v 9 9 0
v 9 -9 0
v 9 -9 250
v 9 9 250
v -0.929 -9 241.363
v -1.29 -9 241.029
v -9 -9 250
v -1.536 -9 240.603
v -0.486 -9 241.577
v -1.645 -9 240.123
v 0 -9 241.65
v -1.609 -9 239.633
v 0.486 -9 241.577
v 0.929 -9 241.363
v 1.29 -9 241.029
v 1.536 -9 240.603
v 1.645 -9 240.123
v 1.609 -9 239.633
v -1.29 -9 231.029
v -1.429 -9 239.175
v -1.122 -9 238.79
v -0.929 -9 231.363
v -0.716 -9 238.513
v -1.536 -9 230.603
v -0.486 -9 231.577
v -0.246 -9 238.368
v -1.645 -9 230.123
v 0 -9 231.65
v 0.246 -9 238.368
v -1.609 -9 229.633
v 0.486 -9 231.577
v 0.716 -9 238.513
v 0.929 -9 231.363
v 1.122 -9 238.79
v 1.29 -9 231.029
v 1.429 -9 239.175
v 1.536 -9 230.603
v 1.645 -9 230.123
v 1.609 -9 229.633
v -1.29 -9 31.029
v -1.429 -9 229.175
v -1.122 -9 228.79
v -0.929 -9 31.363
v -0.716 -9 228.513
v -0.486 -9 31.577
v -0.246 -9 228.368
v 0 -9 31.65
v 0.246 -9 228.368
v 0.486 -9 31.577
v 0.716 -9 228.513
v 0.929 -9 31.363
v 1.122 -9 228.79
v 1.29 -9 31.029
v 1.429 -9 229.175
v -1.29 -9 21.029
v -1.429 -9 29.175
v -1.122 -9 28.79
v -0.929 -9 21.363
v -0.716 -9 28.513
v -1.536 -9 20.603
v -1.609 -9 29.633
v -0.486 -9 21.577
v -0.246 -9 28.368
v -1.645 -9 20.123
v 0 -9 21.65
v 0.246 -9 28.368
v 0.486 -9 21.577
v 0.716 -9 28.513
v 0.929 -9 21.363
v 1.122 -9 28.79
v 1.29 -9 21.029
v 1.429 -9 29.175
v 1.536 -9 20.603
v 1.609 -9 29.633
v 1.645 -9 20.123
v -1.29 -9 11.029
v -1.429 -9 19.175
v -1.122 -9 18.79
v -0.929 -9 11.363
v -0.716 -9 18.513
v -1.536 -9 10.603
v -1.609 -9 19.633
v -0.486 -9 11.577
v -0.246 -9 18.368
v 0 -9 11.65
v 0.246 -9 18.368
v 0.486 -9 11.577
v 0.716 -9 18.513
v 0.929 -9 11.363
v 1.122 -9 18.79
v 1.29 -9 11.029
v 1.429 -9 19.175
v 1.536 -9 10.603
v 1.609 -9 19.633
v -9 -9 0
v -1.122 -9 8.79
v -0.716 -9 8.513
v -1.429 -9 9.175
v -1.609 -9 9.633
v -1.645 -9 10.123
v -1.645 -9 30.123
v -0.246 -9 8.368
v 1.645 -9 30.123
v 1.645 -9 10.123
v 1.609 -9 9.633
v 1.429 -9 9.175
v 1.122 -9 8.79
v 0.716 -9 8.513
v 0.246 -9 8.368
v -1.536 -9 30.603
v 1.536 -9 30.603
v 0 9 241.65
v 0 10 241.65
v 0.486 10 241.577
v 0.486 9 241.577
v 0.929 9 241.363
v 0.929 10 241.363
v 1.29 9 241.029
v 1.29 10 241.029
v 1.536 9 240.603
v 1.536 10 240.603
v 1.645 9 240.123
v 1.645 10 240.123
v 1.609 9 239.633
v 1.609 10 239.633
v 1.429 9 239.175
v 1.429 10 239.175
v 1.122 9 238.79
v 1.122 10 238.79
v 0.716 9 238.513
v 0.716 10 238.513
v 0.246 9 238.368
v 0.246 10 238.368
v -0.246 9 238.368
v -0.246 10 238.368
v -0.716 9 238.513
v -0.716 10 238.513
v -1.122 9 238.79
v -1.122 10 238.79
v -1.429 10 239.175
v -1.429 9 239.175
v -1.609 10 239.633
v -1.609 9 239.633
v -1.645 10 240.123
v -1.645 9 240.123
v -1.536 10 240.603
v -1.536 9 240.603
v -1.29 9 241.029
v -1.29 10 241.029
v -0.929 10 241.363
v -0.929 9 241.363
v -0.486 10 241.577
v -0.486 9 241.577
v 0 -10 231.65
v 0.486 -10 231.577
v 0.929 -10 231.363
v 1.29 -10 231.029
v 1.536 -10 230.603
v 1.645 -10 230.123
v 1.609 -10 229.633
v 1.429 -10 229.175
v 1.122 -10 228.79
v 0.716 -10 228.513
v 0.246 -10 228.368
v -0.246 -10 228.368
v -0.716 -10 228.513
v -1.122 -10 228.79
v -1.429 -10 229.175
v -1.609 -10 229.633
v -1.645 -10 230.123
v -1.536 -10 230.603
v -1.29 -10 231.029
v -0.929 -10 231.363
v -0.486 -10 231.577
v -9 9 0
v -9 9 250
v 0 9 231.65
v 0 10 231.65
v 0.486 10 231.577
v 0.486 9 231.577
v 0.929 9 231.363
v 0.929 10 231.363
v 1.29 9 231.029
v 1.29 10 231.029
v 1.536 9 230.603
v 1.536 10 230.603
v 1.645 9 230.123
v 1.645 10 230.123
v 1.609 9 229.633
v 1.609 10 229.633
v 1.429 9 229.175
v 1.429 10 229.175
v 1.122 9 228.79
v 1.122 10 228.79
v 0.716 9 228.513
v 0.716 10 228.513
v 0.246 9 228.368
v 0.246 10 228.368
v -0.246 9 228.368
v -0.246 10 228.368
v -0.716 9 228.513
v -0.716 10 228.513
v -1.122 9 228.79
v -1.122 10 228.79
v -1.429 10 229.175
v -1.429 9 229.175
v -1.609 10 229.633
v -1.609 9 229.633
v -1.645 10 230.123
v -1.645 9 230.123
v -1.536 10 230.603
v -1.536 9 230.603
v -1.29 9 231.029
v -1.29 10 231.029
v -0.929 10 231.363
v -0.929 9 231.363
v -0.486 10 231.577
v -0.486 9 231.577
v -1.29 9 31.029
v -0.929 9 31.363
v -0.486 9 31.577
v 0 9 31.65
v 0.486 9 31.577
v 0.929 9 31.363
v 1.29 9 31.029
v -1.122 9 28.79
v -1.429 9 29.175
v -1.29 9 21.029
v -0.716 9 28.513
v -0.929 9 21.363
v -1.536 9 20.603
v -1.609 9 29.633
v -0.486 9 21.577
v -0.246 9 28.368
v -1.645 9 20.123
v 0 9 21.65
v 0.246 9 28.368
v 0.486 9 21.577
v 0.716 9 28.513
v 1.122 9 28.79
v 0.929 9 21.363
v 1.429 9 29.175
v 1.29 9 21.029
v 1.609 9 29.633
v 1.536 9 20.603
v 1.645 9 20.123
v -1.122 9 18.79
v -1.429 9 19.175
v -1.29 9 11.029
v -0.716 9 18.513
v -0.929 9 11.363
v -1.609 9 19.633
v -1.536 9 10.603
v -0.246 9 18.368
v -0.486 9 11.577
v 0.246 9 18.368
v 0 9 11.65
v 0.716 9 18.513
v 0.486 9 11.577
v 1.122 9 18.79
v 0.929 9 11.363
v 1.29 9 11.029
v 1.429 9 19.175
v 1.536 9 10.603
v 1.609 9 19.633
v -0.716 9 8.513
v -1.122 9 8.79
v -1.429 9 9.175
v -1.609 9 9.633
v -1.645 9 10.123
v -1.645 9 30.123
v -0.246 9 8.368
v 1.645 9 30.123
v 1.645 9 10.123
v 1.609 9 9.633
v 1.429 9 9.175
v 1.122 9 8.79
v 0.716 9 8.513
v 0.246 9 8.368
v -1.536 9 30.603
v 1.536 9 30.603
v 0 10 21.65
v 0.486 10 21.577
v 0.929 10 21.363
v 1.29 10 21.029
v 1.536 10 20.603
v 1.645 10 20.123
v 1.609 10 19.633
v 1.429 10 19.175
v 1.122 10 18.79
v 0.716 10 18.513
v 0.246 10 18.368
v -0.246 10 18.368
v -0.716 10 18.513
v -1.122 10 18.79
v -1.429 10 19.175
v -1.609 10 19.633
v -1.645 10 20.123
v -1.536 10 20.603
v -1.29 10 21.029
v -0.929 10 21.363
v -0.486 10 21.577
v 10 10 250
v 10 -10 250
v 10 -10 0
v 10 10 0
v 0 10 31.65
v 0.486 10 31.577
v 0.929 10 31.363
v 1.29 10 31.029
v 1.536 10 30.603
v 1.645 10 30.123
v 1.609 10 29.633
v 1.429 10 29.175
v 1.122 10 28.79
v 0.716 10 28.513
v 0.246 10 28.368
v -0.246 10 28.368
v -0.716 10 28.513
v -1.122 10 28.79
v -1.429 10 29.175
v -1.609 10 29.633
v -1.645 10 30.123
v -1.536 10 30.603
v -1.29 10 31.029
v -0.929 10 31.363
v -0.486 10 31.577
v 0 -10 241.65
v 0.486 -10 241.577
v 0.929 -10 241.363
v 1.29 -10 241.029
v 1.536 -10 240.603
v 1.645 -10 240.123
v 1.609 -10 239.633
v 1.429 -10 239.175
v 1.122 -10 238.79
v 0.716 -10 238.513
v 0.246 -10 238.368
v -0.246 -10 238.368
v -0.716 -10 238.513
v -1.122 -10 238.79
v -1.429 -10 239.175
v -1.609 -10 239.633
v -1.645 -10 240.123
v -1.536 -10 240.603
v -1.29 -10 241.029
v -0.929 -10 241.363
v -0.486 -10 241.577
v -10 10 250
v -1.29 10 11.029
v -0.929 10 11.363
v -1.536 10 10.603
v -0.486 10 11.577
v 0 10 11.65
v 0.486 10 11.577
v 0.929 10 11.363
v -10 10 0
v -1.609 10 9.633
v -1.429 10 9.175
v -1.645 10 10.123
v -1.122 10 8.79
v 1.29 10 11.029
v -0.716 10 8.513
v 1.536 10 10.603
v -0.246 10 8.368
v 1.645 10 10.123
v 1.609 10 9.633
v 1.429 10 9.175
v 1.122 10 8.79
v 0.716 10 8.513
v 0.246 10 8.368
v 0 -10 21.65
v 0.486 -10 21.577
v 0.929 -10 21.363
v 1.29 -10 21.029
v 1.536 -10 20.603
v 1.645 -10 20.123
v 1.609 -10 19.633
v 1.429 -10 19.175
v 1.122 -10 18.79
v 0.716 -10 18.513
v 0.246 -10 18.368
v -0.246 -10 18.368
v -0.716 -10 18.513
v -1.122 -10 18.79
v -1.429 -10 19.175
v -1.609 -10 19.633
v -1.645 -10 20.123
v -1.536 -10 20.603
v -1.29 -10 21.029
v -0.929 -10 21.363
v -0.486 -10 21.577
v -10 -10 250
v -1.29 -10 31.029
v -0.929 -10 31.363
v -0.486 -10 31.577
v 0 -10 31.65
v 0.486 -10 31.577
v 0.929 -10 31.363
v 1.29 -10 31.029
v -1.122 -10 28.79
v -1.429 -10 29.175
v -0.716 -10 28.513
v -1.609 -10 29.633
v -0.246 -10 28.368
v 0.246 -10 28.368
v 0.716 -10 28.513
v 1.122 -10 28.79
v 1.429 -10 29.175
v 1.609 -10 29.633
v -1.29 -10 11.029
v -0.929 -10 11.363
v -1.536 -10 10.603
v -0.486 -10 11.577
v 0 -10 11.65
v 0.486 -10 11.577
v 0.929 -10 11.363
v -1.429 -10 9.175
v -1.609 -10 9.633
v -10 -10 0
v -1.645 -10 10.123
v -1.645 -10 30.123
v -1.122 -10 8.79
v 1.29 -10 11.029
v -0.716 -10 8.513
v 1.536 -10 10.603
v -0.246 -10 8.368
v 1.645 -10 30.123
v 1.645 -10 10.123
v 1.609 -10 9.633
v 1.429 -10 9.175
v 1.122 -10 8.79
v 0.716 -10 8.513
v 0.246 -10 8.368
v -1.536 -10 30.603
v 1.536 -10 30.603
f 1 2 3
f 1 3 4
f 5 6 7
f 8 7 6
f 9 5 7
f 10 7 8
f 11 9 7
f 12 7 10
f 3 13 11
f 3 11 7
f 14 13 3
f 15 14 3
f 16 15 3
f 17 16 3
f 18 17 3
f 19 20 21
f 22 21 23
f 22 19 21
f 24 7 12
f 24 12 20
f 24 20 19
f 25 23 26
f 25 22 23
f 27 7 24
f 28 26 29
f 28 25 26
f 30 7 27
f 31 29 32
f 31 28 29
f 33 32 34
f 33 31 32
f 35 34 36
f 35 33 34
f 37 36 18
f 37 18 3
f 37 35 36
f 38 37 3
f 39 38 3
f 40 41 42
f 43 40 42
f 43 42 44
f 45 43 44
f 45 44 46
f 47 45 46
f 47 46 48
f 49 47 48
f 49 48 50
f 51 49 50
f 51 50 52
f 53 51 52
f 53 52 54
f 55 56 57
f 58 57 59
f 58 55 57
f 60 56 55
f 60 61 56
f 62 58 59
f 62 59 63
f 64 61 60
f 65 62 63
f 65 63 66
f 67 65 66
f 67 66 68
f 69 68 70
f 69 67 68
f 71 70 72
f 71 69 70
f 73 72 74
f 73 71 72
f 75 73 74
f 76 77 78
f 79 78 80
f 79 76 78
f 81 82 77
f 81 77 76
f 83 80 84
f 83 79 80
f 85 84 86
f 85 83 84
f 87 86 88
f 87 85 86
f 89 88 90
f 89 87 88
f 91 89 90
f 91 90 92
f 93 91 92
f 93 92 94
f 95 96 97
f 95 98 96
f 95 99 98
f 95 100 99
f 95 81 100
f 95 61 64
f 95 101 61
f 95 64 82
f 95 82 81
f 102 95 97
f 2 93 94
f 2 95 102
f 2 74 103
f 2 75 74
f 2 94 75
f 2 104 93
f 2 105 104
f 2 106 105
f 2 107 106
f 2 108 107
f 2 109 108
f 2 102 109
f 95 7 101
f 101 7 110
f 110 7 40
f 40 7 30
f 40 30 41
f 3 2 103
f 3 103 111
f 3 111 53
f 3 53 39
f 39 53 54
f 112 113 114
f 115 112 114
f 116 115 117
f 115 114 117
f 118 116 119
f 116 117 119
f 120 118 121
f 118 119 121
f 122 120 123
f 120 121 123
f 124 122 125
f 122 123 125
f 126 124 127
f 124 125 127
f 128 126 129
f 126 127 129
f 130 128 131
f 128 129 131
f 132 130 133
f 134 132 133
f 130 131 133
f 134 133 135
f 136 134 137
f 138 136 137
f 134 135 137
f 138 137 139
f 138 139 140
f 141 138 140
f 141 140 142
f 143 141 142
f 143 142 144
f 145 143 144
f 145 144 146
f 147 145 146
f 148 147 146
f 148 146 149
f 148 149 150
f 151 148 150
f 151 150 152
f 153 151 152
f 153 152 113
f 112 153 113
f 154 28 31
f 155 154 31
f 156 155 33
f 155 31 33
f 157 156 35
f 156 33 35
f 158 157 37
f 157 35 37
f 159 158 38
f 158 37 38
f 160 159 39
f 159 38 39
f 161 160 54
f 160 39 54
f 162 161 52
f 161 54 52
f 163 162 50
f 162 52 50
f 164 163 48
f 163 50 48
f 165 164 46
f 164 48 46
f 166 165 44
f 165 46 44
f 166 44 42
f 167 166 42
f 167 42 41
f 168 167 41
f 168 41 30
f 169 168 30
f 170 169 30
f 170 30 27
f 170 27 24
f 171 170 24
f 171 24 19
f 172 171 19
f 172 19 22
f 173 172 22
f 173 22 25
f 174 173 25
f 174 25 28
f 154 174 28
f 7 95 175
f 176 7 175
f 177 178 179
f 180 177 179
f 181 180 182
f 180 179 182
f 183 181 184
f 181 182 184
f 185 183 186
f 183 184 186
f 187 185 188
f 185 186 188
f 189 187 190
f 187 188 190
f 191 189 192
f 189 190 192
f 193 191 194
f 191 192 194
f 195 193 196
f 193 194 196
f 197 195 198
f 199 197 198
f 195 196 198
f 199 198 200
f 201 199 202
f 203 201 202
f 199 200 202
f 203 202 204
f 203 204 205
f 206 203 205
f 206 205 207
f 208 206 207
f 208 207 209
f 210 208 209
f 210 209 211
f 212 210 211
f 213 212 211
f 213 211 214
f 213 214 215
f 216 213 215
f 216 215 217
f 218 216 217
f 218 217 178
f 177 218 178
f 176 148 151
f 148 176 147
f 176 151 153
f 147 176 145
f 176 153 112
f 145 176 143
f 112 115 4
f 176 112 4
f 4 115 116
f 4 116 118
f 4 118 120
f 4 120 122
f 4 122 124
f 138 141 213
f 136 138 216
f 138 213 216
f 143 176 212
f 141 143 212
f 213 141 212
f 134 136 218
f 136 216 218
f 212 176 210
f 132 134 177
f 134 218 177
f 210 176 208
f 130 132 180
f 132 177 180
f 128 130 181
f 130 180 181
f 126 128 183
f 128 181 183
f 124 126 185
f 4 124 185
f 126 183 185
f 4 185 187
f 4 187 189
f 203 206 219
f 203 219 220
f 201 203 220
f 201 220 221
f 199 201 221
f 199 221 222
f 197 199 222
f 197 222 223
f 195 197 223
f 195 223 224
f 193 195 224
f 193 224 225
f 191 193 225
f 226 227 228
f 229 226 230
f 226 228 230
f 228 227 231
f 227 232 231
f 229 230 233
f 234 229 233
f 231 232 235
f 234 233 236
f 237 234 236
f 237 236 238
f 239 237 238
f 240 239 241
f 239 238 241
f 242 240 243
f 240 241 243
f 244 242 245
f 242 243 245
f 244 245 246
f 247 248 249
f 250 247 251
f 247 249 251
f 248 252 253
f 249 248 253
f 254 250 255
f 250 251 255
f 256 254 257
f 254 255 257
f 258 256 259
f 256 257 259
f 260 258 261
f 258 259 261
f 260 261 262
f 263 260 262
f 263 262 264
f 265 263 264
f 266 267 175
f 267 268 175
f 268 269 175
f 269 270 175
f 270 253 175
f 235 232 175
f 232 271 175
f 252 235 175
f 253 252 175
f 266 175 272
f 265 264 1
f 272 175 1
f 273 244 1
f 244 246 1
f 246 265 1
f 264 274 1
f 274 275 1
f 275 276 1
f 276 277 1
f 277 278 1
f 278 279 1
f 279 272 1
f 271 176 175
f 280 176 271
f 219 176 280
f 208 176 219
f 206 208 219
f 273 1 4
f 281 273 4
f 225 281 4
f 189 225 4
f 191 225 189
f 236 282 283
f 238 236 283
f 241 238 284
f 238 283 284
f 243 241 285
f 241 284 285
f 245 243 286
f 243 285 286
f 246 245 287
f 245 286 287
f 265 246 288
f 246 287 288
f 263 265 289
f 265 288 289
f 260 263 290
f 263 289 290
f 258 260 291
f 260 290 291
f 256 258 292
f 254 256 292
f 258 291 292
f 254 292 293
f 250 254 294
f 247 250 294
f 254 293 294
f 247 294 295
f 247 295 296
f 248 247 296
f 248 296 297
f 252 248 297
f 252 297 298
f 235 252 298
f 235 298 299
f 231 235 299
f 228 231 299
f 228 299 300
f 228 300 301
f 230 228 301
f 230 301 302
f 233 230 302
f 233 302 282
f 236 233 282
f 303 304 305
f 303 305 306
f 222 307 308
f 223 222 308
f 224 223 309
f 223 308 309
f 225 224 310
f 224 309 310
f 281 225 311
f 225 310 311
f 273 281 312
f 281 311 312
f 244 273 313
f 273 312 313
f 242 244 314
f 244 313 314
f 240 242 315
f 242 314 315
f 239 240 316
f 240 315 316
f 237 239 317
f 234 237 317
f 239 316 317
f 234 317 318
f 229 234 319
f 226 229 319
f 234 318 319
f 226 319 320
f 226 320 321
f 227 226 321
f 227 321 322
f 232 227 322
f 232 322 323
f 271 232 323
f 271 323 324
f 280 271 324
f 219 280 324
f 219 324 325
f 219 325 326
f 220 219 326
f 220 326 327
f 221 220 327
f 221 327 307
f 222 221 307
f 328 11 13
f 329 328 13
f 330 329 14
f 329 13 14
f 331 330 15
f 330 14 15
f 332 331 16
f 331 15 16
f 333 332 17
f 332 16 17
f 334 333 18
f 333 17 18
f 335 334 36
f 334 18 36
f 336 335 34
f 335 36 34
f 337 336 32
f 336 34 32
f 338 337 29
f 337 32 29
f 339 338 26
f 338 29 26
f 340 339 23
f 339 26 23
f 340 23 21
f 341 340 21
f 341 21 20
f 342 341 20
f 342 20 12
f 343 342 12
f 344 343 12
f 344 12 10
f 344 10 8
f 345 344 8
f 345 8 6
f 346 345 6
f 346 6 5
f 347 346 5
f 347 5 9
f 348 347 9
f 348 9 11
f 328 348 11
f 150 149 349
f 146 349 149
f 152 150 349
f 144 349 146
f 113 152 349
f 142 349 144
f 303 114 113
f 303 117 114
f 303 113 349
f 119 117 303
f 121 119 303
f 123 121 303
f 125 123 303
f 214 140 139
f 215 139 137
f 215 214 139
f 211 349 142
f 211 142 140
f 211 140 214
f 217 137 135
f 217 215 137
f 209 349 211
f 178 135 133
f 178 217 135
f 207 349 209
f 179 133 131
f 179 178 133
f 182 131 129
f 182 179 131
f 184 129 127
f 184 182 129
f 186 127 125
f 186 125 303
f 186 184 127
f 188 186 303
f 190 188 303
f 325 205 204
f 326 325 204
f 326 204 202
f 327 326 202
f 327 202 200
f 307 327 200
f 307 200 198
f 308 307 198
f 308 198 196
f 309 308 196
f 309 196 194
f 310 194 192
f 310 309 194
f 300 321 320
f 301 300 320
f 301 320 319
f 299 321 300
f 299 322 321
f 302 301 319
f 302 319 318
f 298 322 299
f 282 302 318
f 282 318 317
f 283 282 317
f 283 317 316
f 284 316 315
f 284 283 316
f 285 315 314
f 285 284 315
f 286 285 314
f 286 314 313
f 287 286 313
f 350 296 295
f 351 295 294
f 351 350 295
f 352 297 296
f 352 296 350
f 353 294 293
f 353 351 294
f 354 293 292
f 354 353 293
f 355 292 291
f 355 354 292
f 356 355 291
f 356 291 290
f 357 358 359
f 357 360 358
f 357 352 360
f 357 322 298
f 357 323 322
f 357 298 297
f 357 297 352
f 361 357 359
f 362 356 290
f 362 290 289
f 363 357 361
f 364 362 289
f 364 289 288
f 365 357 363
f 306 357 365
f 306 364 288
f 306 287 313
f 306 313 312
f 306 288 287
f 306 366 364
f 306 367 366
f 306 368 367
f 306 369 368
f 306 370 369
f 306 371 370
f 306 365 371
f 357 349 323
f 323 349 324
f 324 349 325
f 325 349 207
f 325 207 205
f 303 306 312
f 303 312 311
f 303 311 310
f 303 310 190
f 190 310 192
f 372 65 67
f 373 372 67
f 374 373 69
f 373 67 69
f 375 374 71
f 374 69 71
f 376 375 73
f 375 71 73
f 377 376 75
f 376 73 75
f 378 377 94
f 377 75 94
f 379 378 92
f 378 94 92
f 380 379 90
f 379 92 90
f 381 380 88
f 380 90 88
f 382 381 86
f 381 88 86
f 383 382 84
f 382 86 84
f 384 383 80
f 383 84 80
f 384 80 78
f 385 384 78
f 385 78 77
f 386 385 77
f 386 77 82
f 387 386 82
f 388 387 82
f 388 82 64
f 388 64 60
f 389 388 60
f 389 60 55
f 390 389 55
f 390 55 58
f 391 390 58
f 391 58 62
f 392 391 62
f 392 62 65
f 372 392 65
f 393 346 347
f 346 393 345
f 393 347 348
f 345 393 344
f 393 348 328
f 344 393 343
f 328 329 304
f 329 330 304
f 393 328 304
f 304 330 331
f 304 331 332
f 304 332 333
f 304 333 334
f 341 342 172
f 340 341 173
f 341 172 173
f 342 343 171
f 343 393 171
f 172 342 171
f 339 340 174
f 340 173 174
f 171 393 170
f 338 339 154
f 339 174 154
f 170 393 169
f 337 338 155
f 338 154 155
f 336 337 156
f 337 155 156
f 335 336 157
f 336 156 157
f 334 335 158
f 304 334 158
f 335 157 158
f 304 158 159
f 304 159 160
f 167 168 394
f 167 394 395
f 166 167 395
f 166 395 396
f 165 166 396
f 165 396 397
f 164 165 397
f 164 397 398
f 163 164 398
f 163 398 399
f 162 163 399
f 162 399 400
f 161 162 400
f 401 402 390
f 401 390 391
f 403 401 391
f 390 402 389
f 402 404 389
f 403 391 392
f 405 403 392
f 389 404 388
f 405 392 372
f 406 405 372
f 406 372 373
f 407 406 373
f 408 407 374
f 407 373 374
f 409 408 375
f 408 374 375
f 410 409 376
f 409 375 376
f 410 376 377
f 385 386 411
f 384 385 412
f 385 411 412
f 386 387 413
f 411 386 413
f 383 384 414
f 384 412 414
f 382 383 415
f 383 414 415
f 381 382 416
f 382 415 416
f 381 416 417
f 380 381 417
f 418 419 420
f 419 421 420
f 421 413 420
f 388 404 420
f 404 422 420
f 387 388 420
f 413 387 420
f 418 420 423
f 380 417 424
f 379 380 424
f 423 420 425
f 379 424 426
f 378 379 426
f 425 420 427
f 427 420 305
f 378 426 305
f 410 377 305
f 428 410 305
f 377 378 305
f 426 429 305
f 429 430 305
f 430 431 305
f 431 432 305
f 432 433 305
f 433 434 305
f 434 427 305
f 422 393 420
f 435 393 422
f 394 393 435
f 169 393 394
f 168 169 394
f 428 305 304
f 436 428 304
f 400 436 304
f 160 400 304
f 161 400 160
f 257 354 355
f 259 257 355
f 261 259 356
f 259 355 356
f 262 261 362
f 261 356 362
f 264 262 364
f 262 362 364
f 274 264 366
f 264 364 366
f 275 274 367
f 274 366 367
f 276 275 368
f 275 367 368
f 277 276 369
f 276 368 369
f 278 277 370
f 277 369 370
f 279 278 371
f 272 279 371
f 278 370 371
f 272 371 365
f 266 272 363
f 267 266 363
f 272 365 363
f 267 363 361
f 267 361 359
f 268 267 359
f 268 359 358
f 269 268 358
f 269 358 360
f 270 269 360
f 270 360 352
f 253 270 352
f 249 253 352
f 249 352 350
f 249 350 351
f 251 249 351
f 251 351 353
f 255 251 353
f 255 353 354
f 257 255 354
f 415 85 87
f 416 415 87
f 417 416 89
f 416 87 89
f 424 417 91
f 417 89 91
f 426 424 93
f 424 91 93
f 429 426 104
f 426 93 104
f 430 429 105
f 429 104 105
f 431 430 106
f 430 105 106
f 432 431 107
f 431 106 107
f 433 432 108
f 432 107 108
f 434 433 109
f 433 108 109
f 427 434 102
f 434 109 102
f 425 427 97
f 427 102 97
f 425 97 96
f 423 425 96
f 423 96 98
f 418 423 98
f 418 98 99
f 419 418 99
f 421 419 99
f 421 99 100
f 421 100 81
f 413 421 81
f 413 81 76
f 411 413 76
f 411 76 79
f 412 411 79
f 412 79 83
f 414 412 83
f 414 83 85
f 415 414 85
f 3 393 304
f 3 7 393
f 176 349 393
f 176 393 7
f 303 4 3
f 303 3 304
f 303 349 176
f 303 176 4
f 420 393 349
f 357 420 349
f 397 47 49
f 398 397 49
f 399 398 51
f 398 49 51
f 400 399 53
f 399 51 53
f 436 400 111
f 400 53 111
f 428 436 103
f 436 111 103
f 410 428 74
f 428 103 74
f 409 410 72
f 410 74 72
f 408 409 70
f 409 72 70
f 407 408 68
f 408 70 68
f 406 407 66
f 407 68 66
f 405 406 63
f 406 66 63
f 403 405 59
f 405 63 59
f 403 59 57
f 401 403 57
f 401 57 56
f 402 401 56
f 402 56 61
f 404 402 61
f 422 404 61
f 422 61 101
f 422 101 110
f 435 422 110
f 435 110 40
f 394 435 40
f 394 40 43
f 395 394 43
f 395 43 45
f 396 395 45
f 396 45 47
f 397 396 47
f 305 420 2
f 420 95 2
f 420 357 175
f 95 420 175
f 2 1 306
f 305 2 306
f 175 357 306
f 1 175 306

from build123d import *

# Parameters (mm, degrees)
SKETCH_1_W          = 20
SKETCH_1_H          = 20
SKETCH_1_W_2        = 18
SKETCH_1_H_2        = 18
EXTRUDE_1_DEPTH     = 250
SKETCH_2_R          = 1.65
CUT_EXTRUDE_1_DEPTH = 251.99800796


with BuildPart() as part:
    # 草图1 → 凸台-拉伸1 (new body)
    with BuildSketch(Plane.XY):
        Rectangle(SKETCH_1_W, SKETCH_1_H)
        Rectangle(SKETCH_1_W_2, SKETCH_1_H_2, mode=Mode.SUBTRACT)
    extrude(amount=EXTRUDE_1_DEPTH)

    # 草图2 → 切除-拉伸1 (cut, through all)
    with BuildSketch(Plane(origin=(0, 10, 0), x_dir=(1, 0, 0), z_dir=(0, 1, 0))):
        with Locations(Location((0, -10, 0), (0, 0, 270))):
            Circle(SKETCH_2_R)
        with Locations(Location((0, -20, 0), (0, 0, 270))):
            Circle(SKETCH_2_R)
        with Locations(Location((0, -30, 0), (0, 0, 270))):
            Circle(SKETCH_2_R)
        with Locations(Location((0, -240, 0), (0, 0, 270))):
            Circle(SKETCH_2_R)
        with Locations(Location((0, -230, 0), (0, 0, 270))):
            Circle(SKETCH_2_R)
    extrude(amount=-CUT_EXTRUDE_1_DEPTH, mode=Mode.SUBTRACT)


solid = part.part
